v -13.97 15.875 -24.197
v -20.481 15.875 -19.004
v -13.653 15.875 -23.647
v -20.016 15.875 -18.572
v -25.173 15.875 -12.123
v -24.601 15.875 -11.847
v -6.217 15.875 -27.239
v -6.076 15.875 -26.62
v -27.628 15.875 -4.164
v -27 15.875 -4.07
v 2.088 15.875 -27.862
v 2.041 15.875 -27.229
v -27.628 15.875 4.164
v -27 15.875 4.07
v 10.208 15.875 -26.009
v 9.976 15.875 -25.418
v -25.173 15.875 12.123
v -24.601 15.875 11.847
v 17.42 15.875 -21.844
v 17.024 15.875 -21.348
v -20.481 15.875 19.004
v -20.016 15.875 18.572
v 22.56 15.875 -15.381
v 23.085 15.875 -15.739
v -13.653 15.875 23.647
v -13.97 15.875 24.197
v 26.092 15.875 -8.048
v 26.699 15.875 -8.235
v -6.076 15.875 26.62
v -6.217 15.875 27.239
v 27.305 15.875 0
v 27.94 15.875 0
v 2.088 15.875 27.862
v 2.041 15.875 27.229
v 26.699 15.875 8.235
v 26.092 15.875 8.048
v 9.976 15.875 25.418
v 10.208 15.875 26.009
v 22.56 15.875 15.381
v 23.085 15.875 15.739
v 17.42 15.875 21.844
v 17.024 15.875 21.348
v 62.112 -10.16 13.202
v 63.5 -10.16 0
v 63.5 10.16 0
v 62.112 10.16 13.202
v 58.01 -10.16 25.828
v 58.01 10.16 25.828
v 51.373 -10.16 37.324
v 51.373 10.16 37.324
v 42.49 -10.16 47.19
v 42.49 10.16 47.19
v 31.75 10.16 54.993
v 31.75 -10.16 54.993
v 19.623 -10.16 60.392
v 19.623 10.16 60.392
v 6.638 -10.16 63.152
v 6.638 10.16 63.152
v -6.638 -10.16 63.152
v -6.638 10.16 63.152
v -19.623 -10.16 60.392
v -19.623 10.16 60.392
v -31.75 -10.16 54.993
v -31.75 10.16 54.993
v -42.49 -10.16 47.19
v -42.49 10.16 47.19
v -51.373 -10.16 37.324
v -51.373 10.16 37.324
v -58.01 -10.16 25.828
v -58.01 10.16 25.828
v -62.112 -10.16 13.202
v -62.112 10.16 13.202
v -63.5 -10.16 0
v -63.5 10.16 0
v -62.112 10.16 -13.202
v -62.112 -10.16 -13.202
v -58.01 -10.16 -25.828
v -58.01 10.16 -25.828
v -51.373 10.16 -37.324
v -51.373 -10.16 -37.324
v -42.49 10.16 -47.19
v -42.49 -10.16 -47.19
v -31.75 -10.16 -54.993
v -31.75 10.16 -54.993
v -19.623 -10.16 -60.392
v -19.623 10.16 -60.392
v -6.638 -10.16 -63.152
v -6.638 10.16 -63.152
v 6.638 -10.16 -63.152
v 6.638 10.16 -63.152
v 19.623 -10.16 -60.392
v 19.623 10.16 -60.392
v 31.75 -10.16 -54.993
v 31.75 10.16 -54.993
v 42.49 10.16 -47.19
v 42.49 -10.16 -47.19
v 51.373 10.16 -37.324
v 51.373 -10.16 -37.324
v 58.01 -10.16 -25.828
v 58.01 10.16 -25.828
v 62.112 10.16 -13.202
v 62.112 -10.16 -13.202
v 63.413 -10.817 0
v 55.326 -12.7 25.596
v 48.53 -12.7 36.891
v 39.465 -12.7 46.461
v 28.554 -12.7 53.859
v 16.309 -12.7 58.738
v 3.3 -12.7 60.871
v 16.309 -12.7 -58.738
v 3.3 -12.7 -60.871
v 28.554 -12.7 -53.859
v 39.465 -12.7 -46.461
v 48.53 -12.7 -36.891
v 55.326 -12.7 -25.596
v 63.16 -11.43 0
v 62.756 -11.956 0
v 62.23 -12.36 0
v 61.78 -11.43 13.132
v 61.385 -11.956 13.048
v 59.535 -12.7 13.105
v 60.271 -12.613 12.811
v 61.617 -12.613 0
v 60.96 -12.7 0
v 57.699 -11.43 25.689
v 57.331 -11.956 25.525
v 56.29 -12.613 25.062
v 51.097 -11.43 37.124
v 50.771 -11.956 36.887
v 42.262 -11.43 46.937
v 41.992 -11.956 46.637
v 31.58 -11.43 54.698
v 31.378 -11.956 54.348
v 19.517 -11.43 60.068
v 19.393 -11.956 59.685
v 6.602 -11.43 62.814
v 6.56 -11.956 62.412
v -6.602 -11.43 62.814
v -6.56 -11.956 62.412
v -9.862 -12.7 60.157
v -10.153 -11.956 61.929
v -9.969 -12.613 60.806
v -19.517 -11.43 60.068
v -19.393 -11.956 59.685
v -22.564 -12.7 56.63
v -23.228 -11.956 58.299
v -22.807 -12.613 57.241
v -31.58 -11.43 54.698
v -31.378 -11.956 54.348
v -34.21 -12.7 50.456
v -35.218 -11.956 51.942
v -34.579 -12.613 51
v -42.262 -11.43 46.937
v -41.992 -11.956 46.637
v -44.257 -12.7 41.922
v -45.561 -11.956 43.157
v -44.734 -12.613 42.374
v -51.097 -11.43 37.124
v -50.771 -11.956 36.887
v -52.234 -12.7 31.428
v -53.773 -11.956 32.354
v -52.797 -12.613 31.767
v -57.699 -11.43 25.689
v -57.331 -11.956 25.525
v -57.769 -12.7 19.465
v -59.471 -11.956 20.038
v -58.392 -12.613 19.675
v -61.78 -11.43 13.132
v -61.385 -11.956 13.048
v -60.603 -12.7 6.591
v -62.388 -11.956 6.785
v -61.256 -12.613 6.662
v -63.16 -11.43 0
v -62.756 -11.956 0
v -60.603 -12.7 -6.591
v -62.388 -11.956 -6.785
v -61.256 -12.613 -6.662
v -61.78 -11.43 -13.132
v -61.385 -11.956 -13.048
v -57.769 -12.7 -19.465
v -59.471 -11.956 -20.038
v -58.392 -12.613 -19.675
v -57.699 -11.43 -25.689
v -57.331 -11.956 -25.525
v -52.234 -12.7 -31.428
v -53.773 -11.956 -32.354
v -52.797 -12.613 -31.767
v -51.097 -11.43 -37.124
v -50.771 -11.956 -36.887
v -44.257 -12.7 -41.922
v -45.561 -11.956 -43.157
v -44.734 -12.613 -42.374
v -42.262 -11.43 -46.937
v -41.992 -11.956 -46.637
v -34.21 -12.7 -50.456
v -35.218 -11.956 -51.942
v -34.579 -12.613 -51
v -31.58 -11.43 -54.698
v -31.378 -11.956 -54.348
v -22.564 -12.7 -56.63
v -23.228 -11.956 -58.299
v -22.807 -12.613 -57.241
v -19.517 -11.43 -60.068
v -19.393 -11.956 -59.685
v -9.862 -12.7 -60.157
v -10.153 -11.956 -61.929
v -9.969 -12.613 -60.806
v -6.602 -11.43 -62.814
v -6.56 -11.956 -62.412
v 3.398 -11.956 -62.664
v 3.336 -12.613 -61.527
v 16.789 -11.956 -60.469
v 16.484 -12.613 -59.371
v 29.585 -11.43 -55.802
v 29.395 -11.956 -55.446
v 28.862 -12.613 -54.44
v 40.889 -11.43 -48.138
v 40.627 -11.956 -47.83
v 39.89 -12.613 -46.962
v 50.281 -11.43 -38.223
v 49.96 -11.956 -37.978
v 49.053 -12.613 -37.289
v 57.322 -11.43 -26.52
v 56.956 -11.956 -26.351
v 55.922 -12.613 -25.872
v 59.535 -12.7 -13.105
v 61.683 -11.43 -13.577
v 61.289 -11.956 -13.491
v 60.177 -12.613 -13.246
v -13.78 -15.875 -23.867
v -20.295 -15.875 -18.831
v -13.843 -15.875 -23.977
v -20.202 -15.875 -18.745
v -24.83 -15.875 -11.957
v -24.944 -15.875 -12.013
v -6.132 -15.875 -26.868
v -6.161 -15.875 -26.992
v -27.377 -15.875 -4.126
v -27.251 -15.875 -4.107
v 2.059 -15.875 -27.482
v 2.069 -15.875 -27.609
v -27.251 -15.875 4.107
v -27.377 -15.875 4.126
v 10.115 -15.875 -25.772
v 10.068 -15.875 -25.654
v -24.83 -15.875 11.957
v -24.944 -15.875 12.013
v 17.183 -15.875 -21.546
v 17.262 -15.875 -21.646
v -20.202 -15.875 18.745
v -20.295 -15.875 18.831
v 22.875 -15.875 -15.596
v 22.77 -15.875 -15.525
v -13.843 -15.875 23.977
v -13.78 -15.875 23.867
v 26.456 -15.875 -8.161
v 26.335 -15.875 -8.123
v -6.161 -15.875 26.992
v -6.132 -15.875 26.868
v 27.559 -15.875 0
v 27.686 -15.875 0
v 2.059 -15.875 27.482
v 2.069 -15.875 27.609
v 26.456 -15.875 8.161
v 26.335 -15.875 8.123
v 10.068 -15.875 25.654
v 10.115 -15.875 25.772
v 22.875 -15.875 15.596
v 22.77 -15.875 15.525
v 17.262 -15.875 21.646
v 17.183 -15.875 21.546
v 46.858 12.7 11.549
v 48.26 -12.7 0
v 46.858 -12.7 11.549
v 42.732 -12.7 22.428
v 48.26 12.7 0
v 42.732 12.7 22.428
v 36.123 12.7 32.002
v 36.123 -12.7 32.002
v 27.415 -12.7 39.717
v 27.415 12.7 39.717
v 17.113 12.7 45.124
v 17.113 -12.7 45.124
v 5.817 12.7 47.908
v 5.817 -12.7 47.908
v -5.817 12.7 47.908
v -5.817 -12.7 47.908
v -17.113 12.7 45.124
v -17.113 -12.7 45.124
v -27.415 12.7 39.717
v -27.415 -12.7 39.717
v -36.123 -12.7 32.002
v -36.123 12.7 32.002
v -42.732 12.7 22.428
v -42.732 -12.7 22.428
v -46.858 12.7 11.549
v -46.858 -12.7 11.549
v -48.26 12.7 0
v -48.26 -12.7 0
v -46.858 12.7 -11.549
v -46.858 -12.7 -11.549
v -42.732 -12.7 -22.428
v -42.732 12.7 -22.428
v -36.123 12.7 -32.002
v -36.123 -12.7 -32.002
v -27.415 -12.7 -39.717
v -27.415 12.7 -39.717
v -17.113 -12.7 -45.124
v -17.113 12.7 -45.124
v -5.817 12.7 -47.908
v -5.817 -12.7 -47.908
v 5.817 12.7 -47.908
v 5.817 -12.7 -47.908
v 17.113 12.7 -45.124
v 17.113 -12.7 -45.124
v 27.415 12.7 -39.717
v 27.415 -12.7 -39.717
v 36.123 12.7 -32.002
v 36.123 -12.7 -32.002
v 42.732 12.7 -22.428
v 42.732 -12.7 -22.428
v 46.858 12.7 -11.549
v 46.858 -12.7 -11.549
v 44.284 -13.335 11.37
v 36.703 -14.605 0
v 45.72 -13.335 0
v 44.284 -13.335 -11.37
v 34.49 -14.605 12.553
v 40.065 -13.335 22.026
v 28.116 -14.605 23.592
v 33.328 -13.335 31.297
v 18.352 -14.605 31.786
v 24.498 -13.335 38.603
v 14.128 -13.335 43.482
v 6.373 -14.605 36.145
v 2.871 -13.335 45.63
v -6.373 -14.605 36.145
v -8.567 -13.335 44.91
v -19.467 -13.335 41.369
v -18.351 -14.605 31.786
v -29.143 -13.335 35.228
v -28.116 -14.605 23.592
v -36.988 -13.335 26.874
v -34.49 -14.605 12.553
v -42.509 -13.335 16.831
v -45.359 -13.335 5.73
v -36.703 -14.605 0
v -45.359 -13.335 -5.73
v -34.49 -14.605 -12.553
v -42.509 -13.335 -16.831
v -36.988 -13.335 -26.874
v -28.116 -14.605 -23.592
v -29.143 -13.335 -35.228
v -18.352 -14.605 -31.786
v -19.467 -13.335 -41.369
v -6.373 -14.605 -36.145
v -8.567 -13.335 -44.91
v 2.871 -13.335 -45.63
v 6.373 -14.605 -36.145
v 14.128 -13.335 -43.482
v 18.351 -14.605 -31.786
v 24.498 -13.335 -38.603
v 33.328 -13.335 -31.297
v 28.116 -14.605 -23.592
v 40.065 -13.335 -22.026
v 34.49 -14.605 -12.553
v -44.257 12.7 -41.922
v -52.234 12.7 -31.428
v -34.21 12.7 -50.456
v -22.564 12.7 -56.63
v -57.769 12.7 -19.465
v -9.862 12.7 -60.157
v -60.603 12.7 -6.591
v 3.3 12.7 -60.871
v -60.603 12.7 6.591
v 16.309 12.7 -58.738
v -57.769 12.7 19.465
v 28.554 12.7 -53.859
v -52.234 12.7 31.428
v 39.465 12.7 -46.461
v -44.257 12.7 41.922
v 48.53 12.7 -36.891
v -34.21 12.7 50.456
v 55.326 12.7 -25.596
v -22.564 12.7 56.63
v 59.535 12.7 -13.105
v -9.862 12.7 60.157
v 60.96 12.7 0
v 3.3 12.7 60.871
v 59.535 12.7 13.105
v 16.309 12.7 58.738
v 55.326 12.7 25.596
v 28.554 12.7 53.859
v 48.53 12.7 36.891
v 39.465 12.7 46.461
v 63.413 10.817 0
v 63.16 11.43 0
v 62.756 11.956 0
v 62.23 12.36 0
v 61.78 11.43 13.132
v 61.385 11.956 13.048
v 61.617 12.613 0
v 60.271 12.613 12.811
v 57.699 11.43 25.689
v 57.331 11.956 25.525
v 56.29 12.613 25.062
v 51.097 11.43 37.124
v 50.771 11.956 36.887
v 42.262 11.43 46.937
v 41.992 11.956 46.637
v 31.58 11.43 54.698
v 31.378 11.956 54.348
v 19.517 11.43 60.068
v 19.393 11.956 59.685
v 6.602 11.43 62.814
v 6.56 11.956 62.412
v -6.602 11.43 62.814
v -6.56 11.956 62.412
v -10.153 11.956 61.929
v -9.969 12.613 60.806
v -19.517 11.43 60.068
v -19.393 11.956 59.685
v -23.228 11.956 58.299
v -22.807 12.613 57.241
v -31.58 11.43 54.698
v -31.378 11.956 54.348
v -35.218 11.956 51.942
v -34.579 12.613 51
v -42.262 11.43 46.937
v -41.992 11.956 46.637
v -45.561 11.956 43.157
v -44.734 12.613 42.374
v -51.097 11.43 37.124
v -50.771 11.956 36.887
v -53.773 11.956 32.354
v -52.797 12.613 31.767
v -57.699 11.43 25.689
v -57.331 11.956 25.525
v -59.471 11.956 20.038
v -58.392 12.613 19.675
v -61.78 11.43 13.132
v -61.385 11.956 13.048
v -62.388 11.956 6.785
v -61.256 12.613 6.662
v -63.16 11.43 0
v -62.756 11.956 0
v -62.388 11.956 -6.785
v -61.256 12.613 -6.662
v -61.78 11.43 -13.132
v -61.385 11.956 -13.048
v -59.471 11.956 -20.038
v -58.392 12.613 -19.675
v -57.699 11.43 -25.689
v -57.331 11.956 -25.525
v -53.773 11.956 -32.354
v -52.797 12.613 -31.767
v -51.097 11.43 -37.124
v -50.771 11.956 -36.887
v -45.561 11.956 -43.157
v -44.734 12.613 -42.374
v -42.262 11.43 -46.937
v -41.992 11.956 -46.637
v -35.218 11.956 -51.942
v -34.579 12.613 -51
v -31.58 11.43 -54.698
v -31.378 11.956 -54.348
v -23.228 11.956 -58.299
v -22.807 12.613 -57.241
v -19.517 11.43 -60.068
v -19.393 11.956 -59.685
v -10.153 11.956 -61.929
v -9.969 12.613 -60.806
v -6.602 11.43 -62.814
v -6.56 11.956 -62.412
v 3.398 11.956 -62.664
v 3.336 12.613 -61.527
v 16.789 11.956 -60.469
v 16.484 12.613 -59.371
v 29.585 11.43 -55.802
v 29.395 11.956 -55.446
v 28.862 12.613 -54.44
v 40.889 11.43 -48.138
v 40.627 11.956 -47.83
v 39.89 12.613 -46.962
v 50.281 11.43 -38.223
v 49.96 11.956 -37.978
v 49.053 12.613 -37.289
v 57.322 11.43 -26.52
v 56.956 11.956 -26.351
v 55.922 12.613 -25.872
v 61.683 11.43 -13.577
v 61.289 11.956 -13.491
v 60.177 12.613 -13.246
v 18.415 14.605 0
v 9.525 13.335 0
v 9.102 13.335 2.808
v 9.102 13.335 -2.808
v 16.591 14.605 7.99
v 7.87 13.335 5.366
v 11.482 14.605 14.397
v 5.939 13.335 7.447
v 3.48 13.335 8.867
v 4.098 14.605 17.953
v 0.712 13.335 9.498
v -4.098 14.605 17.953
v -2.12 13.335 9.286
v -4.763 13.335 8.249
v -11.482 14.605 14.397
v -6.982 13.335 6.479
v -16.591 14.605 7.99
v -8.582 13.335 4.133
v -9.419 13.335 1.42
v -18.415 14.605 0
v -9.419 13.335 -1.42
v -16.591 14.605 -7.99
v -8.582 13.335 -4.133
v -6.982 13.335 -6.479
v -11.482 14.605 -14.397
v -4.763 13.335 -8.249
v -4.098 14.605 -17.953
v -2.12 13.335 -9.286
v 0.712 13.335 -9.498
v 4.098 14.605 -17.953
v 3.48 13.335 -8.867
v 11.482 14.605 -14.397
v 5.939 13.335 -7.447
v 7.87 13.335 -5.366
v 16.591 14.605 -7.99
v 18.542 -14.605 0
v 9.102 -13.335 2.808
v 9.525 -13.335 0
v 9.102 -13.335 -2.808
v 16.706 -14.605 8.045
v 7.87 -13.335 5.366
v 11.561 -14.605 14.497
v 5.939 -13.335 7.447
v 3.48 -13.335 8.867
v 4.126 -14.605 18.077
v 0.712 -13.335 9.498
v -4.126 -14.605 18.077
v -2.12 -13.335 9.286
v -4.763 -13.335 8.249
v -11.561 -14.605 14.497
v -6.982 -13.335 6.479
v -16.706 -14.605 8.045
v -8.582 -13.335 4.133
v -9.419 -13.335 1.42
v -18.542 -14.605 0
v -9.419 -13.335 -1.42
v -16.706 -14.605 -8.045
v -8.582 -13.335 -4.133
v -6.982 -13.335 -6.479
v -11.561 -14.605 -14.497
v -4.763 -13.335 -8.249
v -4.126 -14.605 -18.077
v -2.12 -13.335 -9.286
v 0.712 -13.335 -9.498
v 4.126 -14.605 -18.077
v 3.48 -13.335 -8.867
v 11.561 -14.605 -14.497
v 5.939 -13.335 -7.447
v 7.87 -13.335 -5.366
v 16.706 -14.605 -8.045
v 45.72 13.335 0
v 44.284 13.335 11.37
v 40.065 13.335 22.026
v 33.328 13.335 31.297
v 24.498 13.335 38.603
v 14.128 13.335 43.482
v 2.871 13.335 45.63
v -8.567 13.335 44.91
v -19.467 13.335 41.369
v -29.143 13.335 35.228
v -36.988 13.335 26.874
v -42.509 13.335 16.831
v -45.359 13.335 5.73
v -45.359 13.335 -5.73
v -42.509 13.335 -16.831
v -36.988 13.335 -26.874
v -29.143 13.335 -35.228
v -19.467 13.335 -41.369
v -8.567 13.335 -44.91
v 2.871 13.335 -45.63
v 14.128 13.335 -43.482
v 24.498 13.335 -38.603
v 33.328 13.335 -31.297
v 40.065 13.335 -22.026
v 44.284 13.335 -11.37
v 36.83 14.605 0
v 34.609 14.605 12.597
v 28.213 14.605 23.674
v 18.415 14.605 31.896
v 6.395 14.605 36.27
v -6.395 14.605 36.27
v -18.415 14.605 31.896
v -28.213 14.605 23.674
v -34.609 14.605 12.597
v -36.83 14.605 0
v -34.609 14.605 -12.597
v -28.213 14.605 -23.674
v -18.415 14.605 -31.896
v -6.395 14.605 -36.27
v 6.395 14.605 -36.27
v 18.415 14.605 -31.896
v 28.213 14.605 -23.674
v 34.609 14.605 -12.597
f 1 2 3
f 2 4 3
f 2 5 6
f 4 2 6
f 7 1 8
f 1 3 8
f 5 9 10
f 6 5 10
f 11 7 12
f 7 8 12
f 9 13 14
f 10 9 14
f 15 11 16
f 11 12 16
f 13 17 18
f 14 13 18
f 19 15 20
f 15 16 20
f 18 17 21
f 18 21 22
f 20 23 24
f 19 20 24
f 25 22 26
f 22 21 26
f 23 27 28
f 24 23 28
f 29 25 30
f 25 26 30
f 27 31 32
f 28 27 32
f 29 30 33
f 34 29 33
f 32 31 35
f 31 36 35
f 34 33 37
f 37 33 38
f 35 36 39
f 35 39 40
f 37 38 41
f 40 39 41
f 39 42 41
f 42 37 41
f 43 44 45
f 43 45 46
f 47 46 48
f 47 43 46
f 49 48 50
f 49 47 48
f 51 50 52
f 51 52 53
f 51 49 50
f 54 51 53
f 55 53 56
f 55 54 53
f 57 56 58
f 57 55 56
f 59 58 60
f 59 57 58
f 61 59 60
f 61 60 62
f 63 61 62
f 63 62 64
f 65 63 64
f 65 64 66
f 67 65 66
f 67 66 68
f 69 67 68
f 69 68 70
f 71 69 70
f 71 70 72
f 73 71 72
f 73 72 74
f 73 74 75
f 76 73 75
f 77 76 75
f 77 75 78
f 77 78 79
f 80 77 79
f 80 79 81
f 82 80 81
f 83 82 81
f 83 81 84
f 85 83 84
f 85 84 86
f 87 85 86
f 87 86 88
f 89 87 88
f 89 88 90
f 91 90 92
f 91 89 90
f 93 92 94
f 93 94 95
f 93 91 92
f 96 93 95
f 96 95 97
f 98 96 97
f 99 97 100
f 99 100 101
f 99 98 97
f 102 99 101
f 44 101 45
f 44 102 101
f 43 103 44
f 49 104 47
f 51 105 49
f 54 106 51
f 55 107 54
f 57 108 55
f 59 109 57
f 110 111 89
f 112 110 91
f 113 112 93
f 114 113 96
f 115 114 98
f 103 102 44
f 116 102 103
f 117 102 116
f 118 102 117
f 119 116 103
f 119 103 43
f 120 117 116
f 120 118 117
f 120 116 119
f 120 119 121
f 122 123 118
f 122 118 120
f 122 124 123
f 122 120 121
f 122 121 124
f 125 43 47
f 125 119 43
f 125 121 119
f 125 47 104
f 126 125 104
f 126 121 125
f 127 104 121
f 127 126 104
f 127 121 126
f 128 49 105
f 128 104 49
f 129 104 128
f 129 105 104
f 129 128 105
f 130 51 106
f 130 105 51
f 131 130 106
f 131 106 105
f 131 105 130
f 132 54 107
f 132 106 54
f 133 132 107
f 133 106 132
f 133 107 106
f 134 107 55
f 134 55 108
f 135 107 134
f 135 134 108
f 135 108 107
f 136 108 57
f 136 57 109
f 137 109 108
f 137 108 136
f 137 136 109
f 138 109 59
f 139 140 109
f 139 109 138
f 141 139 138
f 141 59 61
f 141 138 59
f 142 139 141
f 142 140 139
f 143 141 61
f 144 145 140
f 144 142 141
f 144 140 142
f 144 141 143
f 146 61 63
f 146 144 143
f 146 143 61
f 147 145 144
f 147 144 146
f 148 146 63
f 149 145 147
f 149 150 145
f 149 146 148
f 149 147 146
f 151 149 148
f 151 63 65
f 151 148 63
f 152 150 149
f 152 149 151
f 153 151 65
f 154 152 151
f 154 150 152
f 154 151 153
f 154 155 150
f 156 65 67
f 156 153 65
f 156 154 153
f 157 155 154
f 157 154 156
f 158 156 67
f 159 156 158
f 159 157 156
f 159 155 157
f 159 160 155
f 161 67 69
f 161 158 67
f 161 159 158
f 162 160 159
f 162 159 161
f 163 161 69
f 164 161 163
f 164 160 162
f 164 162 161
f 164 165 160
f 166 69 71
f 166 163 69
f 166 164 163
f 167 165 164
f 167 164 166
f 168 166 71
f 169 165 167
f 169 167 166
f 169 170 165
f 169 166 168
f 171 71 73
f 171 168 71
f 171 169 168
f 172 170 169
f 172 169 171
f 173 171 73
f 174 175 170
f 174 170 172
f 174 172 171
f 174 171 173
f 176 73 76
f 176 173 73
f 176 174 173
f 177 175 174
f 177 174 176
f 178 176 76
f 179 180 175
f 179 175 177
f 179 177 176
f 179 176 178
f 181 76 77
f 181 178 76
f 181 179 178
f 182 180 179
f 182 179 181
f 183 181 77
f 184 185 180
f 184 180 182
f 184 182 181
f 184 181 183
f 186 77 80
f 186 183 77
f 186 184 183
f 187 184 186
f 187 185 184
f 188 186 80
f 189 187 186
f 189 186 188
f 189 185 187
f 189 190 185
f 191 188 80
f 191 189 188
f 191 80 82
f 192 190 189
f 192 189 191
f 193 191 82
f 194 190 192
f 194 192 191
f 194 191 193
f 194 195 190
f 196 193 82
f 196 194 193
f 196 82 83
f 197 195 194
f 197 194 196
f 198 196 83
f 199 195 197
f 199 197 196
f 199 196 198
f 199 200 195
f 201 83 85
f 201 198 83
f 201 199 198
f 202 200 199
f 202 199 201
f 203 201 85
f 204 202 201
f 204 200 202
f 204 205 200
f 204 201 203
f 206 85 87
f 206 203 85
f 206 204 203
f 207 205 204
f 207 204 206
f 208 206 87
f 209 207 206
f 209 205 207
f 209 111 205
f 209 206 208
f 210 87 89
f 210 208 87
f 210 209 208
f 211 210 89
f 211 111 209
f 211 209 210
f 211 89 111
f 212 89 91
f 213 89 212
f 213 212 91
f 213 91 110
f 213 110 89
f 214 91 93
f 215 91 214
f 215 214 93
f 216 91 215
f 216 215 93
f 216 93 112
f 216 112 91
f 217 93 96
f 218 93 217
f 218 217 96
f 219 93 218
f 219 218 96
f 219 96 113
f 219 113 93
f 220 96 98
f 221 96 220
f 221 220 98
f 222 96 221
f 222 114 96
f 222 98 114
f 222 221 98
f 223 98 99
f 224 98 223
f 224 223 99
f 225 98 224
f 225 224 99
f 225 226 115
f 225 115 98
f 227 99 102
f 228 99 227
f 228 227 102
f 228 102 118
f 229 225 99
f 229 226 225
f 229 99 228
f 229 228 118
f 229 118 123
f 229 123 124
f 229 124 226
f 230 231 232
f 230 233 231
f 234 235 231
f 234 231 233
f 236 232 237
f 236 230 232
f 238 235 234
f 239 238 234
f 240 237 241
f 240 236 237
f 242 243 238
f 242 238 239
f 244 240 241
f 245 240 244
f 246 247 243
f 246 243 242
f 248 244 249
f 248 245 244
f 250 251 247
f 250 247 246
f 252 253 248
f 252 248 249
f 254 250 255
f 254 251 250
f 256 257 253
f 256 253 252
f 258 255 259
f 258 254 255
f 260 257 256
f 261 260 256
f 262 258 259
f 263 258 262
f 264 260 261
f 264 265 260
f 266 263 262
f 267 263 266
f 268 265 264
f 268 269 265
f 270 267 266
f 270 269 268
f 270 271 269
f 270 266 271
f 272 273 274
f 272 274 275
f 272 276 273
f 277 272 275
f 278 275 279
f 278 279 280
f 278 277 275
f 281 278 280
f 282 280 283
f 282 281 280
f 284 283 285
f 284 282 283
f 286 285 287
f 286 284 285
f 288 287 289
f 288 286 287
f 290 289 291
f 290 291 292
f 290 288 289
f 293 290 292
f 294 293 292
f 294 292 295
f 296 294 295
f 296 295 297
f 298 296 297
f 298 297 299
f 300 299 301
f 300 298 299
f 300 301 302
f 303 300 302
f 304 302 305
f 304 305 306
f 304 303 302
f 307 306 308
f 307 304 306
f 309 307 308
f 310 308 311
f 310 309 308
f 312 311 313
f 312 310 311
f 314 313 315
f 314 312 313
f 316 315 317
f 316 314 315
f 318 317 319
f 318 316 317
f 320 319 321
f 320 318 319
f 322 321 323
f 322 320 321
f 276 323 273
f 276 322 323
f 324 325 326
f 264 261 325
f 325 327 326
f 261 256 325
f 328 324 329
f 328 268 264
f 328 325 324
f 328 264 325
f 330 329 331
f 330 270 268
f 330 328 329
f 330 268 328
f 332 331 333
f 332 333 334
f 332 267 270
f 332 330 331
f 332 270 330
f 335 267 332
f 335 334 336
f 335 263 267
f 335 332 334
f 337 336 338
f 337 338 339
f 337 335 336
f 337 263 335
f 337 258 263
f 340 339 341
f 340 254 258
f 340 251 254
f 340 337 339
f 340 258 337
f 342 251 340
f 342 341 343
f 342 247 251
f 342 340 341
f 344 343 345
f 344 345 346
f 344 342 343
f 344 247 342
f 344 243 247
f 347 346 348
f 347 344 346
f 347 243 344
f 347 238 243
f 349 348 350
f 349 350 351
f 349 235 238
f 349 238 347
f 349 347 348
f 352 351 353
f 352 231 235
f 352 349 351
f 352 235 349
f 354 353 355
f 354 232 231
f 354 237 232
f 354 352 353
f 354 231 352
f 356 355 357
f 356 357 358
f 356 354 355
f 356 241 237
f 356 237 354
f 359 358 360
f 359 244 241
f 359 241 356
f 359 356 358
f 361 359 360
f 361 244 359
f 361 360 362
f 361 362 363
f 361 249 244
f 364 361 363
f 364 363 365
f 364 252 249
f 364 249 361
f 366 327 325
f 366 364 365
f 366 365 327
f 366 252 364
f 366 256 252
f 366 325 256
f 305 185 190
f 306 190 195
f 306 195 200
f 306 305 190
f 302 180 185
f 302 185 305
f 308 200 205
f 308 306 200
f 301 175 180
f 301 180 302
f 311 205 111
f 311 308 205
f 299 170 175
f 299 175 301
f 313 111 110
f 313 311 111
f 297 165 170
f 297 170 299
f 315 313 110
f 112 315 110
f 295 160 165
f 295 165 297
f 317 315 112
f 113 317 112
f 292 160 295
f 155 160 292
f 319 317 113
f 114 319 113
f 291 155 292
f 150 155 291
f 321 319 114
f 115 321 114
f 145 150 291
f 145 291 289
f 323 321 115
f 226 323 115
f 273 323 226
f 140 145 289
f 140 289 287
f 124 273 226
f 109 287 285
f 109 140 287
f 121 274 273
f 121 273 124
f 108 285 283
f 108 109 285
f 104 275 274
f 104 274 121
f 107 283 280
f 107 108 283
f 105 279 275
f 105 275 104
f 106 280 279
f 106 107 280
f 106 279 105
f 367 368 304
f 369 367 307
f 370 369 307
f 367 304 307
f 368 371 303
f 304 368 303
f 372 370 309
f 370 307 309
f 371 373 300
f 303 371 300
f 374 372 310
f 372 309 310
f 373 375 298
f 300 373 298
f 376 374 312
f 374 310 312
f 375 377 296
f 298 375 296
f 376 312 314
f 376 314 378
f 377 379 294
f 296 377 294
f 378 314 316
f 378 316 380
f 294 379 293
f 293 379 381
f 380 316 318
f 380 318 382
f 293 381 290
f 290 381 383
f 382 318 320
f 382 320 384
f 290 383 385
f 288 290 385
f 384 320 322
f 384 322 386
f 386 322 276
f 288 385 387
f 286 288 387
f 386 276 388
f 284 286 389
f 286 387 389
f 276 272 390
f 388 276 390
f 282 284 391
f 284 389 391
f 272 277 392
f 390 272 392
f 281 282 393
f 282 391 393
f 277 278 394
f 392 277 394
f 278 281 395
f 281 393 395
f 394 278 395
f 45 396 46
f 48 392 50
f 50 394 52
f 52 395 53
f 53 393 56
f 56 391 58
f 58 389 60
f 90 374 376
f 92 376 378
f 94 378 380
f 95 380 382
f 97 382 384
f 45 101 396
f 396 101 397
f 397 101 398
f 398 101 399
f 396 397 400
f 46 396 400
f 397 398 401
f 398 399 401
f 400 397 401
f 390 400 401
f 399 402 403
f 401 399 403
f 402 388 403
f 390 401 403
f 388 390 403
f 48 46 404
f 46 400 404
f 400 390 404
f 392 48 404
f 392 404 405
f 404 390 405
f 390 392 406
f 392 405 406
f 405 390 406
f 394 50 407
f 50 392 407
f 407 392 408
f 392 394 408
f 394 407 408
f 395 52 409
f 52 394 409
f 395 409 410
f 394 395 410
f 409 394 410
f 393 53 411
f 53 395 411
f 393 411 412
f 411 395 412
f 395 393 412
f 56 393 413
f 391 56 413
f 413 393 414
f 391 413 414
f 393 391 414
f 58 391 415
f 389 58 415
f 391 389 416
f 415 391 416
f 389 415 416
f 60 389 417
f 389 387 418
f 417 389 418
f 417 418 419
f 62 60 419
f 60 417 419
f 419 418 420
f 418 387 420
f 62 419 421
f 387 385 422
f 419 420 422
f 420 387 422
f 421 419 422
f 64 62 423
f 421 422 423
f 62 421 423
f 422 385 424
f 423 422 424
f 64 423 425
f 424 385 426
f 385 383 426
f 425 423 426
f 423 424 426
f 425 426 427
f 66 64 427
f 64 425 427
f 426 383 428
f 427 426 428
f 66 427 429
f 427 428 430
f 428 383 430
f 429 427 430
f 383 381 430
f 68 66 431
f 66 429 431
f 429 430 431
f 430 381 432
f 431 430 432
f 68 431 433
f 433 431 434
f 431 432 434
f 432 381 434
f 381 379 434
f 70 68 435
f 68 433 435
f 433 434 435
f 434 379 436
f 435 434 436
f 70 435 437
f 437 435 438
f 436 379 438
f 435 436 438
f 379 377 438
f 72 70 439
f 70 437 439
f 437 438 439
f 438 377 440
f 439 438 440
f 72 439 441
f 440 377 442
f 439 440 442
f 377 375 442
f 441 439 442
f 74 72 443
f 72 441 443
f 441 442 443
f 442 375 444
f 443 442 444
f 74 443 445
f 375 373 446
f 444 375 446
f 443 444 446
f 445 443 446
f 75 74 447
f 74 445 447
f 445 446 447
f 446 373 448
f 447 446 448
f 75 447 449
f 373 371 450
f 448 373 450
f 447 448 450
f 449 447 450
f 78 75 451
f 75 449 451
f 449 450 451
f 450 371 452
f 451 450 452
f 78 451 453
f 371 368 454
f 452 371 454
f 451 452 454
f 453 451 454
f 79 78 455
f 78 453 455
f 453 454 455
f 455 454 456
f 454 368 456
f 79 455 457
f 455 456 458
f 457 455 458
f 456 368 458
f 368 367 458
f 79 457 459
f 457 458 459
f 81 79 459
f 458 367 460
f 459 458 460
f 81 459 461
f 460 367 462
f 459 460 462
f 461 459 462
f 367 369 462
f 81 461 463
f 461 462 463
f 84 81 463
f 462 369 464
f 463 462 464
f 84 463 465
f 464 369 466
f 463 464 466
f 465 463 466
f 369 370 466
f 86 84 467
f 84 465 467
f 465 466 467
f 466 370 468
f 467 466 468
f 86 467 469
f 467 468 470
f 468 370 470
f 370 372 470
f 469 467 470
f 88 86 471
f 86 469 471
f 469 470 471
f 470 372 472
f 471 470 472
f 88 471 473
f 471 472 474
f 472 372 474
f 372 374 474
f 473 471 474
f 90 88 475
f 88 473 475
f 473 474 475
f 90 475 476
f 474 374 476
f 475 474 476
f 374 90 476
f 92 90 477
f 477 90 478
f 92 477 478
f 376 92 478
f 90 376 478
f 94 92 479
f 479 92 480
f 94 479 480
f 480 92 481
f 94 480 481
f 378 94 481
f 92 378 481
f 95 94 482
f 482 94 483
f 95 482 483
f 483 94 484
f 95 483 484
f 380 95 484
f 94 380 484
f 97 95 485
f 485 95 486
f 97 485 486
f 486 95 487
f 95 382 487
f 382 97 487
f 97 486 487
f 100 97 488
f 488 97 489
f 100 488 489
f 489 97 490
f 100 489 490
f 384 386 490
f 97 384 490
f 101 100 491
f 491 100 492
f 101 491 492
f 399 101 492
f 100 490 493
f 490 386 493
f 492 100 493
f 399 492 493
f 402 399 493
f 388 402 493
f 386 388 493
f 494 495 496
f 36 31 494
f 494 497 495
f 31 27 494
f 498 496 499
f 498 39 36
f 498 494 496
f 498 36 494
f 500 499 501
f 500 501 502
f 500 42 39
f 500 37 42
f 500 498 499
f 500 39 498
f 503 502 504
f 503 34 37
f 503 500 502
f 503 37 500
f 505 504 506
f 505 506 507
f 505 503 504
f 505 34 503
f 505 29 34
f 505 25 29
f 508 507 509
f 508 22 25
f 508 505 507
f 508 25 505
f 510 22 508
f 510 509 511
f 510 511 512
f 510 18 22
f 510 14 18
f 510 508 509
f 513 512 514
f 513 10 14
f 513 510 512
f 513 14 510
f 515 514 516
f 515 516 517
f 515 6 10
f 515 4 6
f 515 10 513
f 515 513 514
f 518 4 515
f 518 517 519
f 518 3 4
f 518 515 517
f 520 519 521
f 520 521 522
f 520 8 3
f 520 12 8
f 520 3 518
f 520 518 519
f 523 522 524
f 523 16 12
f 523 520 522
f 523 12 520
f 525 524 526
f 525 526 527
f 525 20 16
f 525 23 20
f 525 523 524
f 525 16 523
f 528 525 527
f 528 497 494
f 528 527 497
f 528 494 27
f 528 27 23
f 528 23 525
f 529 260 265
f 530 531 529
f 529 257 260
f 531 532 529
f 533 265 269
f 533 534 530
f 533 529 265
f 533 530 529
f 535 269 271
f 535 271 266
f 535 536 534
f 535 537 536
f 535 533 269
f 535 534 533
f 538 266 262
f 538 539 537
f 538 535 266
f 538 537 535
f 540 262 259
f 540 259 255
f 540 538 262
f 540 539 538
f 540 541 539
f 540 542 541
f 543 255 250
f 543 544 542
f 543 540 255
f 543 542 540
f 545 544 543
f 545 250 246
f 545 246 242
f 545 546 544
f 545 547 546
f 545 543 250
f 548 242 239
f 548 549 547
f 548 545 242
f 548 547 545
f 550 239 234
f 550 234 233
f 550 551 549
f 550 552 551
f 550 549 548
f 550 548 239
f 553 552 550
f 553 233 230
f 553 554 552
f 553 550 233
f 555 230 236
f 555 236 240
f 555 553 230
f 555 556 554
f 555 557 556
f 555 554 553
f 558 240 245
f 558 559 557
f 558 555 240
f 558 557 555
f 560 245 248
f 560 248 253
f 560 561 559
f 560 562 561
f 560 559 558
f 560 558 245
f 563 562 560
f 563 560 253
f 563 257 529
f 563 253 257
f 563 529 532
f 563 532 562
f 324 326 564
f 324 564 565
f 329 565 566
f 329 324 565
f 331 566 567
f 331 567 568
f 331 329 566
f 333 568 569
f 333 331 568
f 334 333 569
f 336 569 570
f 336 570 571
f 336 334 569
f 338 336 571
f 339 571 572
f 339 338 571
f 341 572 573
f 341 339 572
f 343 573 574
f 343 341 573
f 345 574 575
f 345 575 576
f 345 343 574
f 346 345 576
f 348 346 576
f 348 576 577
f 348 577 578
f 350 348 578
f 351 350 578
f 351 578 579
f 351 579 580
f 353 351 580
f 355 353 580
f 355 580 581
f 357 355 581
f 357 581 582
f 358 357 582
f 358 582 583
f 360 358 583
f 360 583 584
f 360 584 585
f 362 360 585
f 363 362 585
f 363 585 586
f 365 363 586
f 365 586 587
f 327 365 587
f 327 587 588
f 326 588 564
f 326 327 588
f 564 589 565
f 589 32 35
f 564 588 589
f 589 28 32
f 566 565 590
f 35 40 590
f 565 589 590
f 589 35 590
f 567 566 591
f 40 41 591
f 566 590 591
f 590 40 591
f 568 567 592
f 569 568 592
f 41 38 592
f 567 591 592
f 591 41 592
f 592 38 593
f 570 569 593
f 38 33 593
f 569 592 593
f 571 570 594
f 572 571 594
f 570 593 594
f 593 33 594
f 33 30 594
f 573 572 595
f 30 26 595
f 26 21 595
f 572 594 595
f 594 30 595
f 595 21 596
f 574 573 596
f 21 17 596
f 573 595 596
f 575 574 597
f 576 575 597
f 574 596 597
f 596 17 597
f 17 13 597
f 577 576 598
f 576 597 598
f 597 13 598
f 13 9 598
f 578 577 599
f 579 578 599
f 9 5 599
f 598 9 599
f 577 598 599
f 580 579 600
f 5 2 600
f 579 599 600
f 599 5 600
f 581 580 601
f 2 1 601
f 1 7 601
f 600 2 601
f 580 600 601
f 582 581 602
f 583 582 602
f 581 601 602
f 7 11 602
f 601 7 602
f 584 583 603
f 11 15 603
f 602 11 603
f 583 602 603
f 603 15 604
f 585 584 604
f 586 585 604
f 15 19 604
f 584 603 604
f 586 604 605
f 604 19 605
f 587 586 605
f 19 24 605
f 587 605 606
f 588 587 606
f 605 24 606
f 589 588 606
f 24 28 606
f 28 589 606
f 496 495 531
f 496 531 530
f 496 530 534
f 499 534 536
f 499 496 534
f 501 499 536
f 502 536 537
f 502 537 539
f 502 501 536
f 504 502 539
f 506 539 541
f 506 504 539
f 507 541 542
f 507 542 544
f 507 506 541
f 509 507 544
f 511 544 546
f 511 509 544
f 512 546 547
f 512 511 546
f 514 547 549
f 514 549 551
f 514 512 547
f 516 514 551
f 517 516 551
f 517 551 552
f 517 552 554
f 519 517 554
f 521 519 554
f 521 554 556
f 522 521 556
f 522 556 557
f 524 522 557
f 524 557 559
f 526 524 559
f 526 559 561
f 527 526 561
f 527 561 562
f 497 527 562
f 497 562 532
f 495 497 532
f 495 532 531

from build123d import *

# Parameters (mm, degrees)
F0_R        = 63.5
F0_R_2      = 48.26
F1_DEPTH    = 12.7
F2_R        = 2.54
F3_R        = 45.72
F3_R_2      = 9.525
F4_DEPTH    = 15.875
F5_C1_SIZE2 = 18.034
F5_C1_SIZE  = 2.54
F5_C2_SIZE2 = 2.54
F5_C2_SIZE  = 18.034
F6_SIZE2    = 17.78
F6_SIZE     = 2.54


with BuildPart() as f1:
    # F0 (on Front) → F1 (new body, symmetric)
    with BuildSketch(Plane.XZ):
        Circle(F0_R)
        Circle(F0_R_2, mode=Mode.SUBTRACT)
    extrude(amount=F1_DEPTH, both=True)

    # F2
    f2_edges = [f1.edges().sort_by_distance(p)[0] for p in [
        (-63.5, 12.7, 0),
        (63.5, 0, 0),
        (-63.5, -12.7, 0),
    ]]
    fillet(f2_edges, radius=F2_R)


with BuildPart() as f4:
    # F3 (on Front) → F4 (new body, symmetric)
    with BuildSketch(Plane.XZ):
        Circle(F3_R)
        Circle(F3_R_2, mode=Mode.SUBTRACT)
    extrude(amount=F4_DEPTH, both=True)

    # F5: chamfer of 18.034 x 2.54 on 2 edges, made by hand

    # F5_c1
    f5_c1_edges = [f4.edges().sort_by_distance(p)[0] for p in [
        (-45.72, -15.875, 0),
    ]]
    f5_c1_side = f4.faces().sort_by_distance((-45.72, -15.8242, 0))[0]
    chamfer(f5_c1_edges, length=F5_C1_SIZE, length2=F5_C1_SIZE2, reference=f5_c1_side)

    # F5_c2
    f5_c2_edges = [f4.edges().sort_by_distance(p)[0] for p in [
        (-9.525, -15.875, 0),
    ]]
    f5_c2_side = f4.faces().sort_by_distance((-9.5758, -15.875, 0))[0]
    chamfer(f5_c2_edges, length=F5_C2_SIZE, length2=F5_C2_SIZE2, reference=f5_c2_side)

    # F6
    f6_edges = [f4.edges().sort_by_distance(p)[0] for p in [
        (-45.72, 15.875, 0),
        (-9.525, 15.875, 0),
    ]]
    chamfer(f6_edges, length=F6_SIZE, length2=F6_SIZE2)


solid = Compound([f1.part, f4.part])
